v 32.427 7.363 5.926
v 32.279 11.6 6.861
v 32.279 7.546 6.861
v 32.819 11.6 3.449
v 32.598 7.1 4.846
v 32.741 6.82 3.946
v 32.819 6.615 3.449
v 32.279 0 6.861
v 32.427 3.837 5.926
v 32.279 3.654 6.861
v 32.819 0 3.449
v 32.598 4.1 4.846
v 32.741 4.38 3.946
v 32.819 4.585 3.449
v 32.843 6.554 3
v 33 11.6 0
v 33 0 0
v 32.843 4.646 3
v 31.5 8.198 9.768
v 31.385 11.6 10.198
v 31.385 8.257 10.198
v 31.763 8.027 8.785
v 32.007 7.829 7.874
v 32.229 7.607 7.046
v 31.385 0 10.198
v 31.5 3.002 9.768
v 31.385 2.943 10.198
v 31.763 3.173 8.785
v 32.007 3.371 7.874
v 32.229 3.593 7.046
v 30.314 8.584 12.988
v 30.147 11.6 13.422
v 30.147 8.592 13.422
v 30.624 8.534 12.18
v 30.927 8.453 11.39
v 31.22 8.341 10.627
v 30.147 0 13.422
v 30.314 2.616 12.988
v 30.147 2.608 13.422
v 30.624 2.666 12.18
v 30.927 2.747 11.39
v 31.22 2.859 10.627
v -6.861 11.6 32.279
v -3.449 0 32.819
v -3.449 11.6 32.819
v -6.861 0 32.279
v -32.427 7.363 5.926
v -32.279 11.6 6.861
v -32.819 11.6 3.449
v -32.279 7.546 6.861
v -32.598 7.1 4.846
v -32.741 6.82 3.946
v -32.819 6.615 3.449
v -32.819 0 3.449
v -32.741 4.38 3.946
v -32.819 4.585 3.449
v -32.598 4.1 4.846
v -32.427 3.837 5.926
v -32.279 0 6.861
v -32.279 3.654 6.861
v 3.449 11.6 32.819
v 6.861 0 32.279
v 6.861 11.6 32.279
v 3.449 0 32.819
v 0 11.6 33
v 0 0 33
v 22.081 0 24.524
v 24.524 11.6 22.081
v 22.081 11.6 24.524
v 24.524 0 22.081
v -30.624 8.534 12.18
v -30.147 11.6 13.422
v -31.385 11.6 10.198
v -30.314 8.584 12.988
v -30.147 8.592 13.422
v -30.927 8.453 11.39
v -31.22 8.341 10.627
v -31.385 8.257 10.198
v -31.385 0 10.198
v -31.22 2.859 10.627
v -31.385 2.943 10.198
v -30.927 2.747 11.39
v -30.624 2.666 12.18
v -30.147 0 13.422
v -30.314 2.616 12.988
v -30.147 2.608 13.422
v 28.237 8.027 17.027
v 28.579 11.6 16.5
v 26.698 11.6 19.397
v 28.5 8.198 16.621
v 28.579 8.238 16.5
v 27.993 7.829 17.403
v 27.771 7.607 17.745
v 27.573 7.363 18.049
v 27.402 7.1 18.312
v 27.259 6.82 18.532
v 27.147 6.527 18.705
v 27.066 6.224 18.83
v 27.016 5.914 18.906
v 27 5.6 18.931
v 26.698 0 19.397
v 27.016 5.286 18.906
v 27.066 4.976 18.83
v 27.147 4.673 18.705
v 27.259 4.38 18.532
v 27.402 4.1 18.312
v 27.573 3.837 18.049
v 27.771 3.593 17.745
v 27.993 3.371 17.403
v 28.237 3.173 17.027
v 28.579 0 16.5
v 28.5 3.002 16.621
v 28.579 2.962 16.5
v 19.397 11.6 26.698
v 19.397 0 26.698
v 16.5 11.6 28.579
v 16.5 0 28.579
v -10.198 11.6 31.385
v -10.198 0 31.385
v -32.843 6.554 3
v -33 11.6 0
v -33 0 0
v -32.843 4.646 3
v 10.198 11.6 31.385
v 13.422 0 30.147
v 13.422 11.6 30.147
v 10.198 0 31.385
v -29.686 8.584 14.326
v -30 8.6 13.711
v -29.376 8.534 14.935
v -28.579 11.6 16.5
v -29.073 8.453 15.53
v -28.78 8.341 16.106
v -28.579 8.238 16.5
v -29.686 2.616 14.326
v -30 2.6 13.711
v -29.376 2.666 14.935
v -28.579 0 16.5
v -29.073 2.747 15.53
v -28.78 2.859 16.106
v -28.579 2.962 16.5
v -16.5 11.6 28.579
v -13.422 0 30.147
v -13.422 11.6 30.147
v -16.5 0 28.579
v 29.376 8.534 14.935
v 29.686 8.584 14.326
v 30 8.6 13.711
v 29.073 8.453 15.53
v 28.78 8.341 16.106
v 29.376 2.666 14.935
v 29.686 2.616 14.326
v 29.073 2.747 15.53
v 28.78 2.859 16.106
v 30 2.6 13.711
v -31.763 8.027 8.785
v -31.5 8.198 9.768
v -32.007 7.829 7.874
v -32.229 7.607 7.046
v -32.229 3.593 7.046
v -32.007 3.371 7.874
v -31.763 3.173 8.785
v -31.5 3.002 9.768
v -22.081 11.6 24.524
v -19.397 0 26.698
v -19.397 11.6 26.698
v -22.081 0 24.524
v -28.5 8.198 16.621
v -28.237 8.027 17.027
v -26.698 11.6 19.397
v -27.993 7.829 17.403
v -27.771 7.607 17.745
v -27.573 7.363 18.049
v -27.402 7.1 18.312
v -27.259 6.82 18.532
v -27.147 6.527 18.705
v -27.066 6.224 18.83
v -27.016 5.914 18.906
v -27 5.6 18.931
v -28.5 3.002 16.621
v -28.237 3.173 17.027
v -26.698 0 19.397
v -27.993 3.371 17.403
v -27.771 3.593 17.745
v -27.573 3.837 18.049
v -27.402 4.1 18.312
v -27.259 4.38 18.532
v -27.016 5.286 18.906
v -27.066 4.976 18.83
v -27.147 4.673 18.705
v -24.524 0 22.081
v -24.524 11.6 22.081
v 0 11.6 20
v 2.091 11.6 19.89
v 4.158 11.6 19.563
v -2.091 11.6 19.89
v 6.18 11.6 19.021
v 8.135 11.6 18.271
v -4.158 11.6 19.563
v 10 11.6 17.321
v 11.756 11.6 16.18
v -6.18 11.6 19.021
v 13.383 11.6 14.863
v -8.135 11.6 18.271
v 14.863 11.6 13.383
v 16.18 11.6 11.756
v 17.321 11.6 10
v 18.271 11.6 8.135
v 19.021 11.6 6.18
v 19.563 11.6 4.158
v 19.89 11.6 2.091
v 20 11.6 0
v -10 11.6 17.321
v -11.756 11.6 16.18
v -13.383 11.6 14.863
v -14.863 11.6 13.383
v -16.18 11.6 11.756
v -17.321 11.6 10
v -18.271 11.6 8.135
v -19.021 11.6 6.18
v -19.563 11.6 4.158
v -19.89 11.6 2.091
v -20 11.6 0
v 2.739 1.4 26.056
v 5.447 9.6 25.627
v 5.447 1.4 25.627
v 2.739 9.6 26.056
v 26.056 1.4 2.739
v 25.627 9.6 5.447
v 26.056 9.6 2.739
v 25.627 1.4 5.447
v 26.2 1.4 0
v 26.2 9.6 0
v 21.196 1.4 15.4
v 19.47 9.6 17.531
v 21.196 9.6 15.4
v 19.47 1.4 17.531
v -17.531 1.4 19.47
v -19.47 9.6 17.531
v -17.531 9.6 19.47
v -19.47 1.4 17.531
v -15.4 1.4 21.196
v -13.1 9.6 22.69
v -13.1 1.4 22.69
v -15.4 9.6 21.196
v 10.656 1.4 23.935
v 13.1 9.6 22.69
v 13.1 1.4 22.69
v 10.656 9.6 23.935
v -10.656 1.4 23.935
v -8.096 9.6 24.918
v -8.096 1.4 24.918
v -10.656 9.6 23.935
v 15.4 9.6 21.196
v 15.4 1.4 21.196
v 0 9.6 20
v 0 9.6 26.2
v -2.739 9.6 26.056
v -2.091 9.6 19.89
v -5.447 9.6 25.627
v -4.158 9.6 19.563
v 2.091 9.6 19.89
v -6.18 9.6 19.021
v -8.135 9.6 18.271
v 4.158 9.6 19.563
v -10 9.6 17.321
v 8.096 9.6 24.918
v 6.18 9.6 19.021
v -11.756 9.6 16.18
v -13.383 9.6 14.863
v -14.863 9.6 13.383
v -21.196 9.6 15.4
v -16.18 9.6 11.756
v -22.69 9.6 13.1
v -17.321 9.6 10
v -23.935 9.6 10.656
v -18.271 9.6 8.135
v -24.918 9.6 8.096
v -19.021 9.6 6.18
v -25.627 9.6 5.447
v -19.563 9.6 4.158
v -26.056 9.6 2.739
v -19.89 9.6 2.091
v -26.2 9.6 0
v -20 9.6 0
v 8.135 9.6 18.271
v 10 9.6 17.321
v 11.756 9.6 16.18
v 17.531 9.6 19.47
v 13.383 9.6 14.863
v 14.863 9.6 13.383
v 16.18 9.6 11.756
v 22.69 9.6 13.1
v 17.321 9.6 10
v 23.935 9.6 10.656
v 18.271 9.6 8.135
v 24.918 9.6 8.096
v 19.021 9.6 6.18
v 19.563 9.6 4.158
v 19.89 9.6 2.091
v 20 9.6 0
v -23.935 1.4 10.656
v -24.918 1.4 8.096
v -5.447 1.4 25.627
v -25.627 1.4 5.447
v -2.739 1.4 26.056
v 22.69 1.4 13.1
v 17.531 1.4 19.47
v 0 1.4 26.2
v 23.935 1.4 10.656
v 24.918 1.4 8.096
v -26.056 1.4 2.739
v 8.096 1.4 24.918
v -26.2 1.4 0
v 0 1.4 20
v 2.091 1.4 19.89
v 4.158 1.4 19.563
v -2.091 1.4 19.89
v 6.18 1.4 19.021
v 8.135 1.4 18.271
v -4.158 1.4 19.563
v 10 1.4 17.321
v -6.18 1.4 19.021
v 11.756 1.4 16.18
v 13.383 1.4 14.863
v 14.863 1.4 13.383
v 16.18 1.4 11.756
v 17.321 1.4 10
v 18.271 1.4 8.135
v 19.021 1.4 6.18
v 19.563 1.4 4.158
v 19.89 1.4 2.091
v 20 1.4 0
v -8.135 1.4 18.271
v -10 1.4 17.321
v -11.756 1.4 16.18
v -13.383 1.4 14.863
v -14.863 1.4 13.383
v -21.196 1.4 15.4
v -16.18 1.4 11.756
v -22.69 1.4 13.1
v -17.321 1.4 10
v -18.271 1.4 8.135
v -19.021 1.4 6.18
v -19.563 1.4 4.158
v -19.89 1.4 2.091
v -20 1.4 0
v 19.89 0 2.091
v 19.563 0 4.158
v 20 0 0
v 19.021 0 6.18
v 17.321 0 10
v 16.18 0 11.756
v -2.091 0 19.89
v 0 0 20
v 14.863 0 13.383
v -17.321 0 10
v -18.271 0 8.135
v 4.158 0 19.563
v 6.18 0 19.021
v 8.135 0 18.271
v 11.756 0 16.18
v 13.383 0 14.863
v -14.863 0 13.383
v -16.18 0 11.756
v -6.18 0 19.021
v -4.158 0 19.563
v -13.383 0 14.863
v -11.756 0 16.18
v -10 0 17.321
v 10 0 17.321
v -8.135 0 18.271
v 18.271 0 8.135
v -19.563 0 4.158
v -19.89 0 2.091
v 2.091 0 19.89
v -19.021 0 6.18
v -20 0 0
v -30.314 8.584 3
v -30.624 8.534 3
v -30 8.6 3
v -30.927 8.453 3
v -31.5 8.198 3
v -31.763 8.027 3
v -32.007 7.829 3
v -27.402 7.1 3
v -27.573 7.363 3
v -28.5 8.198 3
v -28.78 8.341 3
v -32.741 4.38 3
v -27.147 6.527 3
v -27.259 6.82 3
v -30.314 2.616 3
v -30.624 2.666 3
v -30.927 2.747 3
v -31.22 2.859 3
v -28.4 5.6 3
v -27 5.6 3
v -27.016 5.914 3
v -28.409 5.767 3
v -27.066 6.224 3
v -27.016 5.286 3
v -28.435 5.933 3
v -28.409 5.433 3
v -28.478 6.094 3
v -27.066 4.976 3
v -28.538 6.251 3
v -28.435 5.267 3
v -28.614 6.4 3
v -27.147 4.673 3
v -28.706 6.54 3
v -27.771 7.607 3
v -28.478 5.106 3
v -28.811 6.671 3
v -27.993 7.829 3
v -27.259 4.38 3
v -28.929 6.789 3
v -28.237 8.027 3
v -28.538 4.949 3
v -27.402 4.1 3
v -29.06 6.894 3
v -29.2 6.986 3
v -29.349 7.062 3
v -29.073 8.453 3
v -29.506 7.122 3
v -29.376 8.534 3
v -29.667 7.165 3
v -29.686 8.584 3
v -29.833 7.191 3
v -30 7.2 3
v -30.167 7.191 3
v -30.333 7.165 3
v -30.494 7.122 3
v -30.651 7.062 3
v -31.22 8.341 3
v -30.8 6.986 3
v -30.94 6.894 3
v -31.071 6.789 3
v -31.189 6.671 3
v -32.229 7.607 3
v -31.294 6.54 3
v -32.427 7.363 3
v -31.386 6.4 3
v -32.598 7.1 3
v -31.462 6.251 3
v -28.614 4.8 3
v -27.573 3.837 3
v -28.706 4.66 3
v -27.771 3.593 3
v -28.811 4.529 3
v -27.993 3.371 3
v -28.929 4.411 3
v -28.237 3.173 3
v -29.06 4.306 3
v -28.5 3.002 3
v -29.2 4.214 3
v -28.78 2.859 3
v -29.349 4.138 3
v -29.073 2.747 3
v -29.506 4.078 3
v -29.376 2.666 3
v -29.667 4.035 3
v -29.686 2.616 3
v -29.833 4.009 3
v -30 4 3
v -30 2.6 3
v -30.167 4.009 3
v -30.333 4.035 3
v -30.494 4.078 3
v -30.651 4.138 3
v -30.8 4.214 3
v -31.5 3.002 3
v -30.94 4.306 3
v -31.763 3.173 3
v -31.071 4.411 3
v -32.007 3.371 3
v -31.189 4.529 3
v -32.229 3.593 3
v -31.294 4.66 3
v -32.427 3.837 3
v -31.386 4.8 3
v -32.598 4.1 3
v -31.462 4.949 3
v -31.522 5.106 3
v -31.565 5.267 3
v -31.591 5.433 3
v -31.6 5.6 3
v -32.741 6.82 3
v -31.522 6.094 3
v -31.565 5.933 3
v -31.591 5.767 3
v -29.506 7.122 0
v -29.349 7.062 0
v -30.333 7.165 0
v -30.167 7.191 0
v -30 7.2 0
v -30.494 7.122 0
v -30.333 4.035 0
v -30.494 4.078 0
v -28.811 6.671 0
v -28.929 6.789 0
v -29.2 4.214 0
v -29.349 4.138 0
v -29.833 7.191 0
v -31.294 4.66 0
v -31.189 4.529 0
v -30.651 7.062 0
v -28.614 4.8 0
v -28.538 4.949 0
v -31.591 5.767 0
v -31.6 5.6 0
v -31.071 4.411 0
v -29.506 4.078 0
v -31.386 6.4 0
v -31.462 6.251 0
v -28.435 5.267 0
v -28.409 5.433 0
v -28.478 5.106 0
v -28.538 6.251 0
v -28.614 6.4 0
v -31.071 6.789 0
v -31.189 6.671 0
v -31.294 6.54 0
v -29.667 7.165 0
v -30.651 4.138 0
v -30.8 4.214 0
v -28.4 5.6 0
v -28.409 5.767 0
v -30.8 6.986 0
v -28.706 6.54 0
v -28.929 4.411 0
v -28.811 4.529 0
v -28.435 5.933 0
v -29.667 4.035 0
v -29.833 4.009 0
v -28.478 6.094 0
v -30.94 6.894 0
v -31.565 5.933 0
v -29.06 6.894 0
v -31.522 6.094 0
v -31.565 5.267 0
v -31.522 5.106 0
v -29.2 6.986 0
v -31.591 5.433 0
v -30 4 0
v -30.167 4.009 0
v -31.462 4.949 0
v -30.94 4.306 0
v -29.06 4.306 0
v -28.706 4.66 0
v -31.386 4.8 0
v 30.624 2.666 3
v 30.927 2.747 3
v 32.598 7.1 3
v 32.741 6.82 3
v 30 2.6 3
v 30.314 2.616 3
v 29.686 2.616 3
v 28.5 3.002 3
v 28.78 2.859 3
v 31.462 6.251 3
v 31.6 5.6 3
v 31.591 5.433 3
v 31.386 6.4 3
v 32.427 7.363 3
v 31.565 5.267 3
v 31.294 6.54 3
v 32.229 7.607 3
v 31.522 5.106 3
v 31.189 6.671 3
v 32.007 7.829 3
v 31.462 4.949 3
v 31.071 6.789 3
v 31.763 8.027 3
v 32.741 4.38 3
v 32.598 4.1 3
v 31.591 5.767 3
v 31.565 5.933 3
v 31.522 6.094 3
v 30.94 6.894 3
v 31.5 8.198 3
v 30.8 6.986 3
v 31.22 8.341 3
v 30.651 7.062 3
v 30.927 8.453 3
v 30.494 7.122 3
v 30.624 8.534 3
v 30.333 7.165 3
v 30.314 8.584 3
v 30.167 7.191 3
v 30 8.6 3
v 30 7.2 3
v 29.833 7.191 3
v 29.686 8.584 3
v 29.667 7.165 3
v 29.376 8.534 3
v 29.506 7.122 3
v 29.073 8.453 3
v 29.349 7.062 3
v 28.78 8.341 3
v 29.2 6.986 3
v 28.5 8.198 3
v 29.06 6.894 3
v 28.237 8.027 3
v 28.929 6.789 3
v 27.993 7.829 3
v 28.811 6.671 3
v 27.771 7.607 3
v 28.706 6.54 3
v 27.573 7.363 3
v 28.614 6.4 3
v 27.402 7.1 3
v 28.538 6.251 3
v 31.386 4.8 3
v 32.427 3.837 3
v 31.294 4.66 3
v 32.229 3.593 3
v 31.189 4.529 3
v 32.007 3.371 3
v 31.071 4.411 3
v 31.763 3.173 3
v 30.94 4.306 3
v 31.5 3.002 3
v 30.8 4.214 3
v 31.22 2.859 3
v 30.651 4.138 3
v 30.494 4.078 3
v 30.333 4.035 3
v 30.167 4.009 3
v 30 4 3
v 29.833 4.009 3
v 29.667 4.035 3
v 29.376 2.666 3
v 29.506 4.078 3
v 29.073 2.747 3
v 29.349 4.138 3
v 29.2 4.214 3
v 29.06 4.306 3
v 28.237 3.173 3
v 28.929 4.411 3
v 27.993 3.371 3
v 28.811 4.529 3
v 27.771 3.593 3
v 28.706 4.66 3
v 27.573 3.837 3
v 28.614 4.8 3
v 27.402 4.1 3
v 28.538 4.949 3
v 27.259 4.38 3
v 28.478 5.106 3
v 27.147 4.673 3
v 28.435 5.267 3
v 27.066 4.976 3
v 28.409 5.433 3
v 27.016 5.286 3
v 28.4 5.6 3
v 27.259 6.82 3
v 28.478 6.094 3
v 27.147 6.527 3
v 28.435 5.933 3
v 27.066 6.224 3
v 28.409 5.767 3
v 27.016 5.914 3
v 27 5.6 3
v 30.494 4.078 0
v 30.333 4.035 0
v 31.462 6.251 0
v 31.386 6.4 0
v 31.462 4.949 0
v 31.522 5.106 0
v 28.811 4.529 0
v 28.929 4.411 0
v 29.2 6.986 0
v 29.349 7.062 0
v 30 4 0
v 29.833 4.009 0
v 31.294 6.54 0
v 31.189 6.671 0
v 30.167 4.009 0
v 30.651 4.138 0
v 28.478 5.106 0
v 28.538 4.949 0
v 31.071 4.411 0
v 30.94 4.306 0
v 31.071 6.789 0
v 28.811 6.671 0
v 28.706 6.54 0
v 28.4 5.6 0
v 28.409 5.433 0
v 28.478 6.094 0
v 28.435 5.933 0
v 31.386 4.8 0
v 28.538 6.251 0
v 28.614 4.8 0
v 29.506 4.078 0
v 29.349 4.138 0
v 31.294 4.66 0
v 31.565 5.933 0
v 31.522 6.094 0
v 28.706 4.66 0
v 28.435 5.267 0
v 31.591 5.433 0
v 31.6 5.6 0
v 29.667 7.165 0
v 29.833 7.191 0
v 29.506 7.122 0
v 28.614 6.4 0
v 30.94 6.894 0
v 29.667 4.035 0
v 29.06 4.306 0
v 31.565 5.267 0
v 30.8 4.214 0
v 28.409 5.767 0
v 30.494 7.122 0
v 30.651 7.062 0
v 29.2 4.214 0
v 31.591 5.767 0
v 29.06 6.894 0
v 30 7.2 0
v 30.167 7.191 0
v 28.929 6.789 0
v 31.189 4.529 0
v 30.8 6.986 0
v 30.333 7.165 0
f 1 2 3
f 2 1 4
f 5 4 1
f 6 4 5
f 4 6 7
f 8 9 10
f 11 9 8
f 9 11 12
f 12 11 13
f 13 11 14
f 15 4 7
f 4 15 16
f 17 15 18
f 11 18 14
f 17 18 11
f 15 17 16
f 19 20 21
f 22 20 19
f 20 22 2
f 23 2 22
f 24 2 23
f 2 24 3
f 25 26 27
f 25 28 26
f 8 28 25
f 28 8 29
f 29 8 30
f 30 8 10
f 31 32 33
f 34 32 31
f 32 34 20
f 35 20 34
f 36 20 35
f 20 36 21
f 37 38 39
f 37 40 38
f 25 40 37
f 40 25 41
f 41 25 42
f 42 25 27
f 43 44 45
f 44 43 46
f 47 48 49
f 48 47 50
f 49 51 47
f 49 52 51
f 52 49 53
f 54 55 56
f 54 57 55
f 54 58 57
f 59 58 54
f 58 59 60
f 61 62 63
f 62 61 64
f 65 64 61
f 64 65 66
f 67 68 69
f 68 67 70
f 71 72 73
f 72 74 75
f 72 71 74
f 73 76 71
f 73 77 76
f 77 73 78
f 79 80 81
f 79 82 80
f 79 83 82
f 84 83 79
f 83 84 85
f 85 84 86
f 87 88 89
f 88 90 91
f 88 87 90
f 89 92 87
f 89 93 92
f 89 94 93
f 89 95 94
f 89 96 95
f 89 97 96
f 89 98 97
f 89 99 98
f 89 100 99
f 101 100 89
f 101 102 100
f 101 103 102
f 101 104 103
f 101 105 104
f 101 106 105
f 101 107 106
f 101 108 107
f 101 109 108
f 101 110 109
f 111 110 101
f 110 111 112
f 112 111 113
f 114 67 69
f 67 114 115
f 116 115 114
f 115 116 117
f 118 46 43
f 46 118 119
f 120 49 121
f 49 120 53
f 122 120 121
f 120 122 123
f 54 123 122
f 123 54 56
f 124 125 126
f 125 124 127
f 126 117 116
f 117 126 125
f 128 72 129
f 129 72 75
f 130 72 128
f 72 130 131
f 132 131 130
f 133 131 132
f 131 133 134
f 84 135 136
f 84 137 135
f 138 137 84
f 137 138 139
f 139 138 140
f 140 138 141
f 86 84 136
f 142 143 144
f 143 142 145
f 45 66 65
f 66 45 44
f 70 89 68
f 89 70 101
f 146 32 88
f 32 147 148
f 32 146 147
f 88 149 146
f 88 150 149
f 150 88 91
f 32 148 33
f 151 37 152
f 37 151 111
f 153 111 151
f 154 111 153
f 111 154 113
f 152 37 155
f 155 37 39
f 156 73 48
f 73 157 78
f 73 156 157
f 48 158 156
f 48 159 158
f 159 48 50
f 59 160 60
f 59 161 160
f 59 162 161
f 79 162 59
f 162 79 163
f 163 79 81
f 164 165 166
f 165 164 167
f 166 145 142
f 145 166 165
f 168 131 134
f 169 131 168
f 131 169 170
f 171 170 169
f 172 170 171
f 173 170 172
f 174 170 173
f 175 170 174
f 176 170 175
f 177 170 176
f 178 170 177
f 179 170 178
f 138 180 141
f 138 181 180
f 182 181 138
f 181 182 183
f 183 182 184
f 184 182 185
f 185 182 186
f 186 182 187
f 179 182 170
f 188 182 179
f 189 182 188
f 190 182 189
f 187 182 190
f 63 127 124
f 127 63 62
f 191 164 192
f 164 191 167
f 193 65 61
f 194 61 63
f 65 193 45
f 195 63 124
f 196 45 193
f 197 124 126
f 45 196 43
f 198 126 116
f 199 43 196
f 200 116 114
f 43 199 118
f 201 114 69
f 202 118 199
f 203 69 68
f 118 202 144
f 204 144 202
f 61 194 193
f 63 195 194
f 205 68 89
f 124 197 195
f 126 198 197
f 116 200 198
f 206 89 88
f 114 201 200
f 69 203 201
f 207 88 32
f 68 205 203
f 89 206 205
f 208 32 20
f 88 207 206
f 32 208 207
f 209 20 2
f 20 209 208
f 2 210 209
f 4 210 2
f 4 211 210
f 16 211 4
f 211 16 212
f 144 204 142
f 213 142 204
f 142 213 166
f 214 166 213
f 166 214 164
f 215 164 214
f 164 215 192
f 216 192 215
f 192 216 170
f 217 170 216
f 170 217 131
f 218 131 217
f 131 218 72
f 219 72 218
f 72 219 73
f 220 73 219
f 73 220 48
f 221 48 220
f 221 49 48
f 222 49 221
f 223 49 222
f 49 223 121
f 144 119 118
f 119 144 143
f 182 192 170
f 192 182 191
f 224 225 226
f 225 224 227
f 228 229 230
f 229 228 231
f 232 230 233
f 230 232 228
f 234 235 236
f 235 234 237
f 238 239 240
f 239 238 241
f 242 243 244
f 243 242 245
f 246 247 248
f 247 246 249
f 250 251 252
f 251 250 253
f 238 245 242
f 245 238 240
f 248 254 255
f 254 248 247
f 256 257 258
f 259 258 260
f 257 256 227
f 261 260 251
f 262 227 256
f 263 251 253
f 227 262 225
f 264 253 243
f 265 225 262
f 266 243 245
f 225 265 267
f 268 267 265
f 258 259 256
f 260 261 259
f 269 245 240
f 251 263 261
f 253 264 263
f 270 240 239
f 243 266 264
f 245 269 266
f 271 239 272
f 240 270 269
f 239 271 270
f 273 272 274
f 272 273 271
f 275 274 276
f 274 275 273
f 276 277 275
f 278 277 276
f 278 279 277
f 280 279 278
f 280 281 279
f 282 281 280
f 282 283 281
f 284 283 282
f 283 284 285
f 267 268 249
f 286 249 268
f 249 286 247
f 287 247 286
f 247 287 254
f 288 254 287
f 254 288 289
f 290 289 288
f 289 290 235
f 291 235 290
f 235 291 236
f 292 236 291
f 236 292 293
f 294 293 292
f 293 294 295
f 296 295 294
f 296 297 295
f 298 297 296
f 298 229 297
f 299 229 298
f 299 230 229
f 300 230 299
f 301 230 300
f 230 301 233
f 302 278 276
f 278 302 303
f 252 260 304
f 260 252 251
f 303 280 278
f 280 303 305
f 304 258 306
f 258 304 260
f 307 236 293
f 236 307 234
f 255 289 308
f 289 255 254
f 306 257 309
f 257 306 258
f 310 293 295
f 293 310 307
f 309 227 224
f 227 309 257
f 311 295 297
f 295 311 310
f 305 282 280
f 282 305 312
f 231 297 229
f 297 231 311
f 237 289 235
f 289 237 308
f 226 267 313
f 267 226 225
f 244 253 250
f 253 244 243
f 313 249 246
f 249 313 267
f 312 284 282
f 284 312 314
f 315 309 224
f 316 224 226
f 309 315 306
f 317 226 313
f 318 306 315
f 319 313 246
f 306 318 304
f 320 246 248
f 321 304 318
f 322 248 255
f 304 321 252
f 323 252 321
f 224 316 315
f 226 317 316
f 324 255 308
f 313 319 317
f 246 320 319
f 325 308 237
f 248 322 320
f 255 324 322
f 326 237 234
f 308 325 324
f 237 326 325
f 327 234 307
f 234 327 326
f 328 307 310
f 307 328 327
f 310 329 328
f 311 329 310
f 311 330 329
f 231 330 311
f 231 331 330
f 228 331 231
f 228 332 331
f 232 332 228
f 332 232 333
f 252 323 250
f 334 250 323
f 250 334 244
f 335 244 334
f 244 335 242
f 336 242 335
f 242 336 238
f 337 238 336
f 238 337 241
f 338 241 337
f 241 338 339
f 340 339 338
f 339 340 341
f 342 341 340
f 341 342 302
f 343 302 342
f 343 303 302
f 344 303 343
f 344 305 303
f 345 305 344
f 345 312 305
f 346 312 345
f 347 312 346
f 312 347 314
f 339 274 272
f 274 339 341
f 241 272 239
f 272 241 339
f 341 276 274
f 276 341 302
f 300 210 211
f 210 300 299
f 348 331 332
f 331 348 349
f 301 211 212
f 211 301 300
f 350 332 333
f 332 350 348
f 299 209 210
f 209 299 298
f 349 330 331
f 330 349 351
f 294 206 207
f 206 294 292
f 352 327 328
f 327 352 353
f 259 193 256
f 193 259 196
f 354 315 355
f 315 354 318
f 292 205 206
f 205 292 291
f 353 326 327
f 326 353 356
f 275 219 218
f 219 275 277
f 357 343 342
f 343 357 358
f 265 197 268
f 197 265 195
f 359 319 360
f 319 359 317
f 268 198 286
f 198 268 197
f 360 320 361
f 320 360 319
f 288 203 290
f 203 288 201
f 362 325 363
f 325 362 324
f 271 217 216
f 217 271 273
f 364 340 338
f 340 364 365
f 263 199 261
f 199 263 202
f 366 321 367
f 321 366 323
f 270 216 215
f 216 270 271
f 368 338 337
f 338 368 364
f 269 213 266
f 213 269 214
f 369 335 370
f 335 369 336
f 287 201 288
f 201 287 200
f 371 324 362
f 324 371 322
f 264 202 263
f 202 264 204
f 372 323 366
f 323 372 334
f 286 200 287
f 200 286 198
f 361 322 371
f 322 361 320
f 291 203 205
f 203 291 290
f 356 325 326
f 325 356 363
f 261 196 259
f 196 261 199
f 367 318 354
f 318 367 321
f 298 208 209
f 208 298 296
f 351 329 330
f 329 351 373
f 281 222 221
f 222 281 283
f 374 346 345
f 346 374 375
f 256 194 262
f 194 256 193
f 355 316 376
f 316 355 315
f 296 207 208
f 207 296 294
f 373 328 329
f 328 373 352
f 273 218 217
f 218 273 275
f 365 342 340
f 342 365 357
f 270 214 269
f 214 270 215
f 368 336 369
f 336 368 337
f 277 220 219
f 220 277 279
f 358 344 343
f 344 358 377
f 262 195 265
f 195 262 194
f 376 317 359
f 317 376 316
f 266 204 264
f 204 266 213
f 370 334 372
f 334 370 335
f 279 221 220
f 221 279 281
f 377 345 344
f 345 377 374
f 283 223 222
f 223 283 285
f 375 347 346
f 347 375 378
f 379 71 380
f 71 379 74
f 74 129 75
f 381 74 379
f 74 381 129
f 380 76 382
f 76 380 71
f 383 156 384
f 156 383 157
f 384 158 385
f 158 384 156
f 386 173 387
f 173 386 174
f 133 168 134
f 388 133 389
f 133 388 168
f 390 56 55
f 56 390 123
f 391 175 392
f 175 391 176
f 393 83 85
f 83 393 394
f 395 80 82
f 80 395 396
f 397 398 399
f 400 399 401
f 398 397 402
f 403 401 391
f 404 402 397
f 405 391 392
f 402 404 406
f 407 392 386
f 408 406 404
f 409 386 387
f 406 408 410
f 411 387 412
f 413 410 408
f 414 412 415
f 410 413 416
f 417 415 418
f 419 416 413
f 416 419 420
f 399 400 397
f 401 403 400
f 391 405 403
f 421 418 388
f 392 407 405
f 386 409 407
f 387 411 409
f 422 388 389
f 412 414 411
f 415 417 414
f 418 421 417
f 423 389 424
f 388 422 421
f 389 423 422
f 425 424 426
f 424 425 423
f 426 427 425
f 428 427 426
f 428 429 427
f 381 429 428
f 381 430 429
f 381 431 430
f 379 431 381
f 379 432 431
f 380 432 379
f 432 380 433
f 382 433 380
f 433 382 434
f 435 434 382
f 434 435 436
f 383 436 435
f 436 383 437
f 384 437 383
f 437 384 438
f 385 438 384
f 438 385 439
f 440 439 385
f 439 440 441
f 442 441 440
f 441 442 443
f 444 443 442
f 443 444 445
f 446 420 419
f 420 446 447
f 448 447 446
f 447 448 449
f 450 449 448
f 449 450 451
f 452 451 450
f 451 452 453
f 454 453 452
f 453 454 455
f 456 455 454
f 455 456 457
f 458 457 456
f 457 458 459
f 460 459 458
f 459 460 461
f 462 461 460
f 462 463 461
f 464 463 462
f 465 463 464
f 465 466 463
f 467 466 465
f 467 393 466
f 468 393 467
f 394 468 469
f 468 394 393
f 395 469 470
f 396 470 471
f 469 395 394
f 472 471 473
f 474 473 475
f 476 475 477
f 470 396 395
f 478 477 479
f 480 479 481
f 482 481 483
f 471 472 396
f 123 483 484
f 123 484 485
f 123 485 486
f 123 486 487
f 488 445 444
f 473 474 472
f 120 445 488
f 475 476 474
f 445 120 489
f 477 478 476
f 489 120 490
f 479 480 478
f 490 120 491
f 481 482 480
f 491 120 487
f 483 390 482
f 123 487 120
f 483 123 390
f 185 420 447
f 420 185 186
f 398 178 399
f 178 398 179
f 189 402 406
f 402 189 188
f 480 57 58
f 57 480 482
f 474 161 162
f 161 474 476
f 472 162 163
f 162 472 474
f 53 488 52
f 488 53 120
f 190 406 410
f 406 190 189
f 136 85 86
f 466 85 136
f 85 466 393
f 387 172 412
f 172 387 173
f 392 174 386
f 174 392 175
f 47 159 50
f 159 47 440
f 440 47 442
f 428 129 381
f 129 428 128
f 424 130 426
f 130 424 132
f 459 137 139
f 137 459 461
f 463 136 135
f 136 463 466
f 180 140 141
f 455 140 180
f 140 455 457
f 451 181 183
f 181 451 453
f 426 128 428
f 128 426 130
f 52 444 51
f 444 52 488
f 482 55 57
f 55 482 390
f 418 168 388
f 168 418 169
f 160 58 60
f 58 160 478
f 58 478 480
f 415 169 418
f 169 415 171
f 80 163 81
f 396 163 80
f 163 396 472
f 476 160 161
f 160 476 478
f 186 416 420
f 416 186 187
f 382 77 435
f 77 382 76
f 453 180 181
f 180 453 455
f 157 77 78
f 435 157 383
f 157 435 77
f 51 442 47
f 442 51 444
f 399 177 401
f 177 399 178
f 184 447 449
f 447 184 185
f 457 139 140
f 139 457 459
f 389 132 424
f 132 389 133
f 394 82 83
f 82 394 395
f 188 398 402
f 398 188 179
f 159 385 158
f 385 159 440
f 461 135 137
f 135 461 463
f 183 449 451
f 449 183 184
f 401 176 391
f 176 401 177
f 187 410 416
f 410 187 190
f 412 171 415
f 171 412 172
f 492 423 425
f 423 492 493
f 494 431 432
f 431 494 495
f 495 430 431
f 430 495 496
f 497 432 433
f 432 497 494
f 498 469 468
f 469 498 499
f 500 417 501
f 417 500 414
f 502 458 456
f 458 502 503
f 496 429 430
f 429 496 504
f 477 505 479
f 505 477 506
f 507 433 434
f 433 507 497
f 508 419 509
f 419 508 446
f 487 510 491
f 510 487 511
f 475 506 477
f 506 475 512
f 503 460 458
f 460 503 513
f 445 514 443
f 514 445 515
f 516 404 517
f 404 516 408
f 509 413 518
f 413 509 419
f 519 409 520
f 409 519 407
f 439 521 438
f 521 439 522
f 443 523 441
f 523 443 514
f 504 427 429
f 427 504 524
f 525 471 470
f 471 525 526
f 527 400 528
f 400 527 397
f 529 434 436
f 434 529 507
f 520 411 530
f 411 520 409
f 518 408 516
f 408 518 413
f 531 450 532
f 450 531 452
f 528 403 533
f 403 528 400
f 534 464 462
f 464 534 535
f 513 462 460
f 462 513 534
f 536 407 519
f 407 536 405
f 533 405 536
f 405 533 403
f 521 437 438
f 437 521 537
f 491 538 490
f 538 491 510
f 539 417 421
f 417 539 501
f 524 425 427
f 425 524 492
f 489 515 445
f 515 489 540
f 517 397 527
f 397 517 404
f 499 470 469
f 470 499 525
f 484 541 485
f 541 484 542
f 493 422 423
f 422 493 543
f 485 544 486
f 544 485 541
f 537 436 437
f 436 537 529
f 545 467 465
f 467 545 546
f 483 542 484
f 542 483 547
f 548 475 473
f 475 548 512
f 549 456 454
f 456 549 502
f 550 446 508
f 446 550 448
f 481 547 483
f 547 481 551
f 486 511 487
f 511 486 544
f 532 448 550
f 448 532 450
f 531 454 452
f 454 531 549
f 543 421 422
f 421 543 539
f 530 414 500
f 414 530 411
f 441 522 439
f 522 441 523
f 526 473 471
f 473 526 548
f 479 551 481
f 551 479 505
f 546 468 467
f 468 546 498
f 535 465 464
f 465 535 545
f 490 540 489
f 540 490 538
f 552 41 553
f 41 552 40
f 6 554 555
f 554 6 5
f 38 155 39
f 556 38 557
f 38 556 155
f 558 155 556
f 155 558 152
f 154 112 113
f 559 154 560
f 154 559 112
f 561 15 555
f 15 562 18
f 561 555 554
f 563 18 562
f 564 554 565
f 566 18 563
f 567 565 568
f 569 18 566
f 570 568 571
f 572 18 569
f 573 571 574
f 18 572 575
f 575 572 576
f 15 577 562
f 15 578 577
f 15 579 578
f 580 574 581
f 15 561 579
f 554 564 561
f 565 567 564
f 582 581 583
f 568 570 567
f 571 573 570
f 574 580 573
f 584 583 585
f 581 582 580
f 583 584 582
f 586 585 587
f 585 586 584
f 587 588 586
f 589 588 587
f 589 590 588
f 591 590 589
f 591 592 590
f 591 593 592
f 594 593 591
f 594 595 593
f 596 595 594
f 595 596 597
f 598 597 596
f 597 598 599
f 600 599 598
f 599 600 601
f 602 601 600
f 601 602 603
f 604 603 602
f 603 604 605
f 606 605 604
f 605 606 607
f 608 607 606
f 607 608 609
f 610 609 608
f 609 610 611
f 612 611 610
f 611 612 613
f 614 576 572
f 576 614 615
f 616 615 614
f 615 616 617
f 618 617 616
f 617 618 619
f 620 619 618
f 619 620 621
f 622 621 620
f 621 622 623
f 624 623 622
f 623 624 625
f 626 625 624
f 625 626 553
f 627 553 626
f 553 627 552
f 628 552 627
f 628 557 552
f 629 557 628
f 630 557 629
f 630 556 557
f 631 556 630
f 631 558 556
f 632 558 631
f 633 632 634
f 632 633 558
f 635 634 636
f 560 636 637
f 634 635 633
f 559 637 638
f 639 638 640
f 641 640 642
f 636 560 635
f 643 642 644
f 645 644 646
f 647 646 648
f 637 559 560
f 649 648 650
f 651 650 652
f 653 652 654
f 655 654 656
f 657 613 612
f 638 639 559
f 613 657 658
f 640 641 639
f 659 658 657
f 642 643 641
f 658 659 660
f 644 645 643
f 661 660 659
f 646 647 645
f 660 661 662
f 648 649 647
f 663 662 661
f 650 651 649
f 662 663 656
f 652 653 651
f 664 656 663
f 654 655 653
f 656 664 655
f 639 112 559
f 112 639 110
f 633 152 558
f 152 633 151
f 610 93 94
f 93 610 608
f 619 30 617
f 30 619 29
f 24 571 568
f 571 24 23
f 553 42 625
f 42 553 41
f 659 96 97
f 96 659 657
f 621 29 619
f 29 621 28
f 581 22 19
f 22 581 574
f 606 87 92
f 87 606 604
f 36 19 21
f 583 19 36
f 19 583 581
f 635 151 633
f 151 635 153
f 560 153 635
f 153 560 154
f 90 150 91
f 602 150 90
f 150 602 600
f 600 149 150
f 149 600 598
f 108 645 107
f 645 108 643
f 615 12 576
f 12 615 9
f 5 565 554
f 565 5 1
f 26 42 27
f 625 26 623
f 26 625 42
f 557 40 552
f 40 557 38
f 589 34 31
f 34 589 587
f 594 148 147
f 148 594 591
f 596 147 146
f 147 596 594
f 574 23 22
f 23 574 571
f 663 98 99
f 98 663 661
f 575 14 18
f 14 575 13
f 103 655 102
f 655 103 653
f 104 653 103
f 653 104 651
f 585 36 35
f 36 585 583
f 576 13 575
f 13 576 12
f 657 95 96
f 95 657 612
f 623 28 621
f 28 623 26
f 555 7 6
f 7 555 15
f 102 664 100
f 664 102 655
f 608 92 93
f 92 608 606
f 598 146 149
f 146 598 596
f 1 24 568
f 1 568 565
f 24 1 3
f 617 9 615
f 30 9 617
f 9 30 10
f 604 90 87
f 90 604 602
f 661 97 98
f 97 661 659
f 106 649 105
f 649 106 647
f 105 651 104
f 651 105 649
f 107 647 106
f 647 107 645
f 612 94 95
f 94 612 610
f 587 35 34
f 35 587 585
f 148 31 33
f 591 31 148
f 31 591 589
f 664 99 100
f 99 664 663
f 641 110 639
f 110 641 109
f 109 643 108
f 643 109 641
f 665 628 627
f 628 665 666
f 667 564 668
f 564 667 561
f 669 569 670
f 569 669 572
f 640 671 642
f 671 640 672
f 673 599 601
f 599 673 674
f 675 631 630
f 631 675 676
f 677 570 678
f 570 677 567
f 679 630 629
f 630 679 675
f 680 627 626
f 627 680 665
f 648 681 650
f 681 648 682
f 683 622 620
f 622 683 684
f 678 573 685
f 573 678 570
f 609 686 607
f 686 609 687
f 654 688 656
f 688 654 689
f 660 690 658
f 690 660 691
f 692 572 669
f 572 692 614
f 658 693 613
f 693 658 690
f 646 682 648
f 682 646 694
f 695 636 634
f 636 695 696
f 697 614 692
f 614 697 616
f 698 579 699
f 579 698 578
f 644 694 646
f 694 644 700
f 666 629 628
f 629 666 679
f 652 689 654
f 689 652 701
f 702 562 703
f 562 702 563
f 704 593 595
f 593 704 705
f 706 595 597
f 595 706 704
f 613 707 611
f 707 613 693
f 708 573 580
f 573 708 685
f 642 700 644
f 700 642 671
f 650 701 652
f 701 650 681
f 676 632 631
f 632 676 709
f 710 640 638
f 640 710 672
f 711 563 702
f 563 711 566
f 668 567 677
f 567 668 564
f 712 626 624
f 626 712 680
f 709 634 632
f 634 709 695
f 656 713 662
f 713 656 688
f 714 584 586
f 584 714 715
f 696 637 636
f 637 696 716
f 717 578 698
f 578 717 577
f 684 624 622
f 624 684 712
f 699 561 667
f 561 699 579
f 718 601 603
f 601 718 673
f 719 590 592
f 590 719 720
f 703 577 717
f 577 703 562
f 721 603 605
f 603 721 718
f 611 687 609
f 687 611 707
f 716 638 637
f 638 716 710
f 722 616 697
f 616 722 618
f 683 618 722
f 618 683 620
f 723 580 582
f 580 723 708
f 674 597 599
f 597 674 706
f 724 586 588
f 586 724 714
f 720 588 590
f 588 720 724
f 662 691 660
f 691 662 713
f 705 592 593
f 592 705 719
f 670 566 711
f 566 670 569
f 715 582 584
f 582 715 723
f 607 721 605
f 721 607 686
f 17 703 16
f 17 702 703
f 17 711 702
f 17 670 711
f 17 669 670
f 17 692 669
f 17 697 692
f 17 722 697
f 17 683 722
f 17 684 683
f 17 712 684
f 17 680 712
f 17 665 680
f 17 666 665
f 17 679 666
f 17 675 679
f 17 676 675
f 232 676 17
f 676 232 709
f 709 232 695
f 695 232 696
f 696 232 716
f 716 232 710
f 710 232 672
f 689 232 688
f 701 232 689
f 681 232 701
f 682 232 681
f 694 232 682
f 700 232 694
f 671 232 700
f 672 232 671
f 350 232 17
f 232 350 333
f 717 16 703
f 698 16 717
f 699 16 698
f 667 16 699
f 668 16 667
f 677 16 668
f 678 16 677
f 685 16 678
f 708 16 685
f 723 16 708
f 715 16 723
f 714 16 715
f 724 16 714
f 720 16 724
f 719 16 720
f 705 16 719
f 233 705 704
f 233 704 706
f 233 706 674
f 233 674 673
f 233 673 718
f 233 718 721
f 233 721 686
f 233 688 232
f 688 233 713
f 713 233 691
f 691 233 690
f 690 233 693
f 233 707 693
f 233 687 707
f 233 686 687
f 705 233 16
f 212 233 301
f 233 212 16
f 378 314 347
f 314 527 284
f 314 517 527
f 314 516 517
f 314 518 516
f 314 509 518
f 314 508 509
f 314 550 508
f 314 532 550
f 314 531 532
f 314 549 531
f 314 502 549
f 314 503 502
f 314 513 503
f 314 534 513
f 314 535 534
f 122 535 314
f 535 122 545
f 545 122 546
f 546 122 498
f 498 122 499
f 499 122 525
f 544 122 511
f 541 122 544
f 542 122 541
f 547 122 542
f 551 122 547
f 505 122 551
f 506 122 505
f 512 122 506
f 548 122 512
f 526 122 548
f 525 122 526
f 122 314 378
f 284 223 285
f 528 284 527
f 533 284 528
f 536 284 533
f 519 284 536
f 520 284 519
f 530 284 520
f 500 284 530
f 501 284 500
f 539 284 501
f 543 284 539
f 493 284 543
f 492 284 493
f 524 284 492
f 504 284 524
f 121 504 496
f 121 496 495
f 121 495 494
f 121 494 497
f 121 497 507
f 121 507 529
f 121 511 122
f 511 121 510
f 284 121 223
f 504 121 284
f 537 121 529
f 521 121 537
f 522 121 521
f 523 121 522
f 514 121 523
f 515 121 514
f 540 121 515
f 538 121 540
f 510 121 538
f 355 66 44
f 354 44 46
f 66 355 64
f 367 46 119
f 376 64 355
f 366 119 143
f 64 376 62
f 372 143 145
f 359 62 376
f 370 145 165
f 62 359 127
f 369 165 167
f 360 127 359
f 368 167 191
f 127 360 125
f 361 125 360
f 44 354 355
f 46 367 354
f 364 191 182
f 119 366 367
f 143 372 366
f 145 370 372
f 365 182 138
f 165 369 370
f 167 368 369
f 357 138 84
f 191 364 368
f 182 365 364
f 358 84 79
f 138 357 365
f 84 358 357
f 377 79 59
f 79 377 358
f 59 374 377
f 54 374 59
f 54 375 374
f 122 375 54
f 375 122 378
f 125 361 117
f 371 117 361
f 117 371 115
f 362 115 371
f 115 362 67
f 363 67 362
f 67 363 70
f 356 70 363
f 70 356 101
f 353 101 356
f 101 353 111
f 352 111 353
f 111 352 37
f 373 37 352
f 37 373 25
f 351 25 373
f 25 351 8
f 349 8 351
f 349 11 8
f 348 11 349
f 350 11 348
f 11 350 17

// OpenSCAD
// Корпус полузажима энкодера. Open this file, F5 preview, F6 render, export STL.
use <reference_model.scad>
$fn=60;
encoder_clamp_body_for_print();
